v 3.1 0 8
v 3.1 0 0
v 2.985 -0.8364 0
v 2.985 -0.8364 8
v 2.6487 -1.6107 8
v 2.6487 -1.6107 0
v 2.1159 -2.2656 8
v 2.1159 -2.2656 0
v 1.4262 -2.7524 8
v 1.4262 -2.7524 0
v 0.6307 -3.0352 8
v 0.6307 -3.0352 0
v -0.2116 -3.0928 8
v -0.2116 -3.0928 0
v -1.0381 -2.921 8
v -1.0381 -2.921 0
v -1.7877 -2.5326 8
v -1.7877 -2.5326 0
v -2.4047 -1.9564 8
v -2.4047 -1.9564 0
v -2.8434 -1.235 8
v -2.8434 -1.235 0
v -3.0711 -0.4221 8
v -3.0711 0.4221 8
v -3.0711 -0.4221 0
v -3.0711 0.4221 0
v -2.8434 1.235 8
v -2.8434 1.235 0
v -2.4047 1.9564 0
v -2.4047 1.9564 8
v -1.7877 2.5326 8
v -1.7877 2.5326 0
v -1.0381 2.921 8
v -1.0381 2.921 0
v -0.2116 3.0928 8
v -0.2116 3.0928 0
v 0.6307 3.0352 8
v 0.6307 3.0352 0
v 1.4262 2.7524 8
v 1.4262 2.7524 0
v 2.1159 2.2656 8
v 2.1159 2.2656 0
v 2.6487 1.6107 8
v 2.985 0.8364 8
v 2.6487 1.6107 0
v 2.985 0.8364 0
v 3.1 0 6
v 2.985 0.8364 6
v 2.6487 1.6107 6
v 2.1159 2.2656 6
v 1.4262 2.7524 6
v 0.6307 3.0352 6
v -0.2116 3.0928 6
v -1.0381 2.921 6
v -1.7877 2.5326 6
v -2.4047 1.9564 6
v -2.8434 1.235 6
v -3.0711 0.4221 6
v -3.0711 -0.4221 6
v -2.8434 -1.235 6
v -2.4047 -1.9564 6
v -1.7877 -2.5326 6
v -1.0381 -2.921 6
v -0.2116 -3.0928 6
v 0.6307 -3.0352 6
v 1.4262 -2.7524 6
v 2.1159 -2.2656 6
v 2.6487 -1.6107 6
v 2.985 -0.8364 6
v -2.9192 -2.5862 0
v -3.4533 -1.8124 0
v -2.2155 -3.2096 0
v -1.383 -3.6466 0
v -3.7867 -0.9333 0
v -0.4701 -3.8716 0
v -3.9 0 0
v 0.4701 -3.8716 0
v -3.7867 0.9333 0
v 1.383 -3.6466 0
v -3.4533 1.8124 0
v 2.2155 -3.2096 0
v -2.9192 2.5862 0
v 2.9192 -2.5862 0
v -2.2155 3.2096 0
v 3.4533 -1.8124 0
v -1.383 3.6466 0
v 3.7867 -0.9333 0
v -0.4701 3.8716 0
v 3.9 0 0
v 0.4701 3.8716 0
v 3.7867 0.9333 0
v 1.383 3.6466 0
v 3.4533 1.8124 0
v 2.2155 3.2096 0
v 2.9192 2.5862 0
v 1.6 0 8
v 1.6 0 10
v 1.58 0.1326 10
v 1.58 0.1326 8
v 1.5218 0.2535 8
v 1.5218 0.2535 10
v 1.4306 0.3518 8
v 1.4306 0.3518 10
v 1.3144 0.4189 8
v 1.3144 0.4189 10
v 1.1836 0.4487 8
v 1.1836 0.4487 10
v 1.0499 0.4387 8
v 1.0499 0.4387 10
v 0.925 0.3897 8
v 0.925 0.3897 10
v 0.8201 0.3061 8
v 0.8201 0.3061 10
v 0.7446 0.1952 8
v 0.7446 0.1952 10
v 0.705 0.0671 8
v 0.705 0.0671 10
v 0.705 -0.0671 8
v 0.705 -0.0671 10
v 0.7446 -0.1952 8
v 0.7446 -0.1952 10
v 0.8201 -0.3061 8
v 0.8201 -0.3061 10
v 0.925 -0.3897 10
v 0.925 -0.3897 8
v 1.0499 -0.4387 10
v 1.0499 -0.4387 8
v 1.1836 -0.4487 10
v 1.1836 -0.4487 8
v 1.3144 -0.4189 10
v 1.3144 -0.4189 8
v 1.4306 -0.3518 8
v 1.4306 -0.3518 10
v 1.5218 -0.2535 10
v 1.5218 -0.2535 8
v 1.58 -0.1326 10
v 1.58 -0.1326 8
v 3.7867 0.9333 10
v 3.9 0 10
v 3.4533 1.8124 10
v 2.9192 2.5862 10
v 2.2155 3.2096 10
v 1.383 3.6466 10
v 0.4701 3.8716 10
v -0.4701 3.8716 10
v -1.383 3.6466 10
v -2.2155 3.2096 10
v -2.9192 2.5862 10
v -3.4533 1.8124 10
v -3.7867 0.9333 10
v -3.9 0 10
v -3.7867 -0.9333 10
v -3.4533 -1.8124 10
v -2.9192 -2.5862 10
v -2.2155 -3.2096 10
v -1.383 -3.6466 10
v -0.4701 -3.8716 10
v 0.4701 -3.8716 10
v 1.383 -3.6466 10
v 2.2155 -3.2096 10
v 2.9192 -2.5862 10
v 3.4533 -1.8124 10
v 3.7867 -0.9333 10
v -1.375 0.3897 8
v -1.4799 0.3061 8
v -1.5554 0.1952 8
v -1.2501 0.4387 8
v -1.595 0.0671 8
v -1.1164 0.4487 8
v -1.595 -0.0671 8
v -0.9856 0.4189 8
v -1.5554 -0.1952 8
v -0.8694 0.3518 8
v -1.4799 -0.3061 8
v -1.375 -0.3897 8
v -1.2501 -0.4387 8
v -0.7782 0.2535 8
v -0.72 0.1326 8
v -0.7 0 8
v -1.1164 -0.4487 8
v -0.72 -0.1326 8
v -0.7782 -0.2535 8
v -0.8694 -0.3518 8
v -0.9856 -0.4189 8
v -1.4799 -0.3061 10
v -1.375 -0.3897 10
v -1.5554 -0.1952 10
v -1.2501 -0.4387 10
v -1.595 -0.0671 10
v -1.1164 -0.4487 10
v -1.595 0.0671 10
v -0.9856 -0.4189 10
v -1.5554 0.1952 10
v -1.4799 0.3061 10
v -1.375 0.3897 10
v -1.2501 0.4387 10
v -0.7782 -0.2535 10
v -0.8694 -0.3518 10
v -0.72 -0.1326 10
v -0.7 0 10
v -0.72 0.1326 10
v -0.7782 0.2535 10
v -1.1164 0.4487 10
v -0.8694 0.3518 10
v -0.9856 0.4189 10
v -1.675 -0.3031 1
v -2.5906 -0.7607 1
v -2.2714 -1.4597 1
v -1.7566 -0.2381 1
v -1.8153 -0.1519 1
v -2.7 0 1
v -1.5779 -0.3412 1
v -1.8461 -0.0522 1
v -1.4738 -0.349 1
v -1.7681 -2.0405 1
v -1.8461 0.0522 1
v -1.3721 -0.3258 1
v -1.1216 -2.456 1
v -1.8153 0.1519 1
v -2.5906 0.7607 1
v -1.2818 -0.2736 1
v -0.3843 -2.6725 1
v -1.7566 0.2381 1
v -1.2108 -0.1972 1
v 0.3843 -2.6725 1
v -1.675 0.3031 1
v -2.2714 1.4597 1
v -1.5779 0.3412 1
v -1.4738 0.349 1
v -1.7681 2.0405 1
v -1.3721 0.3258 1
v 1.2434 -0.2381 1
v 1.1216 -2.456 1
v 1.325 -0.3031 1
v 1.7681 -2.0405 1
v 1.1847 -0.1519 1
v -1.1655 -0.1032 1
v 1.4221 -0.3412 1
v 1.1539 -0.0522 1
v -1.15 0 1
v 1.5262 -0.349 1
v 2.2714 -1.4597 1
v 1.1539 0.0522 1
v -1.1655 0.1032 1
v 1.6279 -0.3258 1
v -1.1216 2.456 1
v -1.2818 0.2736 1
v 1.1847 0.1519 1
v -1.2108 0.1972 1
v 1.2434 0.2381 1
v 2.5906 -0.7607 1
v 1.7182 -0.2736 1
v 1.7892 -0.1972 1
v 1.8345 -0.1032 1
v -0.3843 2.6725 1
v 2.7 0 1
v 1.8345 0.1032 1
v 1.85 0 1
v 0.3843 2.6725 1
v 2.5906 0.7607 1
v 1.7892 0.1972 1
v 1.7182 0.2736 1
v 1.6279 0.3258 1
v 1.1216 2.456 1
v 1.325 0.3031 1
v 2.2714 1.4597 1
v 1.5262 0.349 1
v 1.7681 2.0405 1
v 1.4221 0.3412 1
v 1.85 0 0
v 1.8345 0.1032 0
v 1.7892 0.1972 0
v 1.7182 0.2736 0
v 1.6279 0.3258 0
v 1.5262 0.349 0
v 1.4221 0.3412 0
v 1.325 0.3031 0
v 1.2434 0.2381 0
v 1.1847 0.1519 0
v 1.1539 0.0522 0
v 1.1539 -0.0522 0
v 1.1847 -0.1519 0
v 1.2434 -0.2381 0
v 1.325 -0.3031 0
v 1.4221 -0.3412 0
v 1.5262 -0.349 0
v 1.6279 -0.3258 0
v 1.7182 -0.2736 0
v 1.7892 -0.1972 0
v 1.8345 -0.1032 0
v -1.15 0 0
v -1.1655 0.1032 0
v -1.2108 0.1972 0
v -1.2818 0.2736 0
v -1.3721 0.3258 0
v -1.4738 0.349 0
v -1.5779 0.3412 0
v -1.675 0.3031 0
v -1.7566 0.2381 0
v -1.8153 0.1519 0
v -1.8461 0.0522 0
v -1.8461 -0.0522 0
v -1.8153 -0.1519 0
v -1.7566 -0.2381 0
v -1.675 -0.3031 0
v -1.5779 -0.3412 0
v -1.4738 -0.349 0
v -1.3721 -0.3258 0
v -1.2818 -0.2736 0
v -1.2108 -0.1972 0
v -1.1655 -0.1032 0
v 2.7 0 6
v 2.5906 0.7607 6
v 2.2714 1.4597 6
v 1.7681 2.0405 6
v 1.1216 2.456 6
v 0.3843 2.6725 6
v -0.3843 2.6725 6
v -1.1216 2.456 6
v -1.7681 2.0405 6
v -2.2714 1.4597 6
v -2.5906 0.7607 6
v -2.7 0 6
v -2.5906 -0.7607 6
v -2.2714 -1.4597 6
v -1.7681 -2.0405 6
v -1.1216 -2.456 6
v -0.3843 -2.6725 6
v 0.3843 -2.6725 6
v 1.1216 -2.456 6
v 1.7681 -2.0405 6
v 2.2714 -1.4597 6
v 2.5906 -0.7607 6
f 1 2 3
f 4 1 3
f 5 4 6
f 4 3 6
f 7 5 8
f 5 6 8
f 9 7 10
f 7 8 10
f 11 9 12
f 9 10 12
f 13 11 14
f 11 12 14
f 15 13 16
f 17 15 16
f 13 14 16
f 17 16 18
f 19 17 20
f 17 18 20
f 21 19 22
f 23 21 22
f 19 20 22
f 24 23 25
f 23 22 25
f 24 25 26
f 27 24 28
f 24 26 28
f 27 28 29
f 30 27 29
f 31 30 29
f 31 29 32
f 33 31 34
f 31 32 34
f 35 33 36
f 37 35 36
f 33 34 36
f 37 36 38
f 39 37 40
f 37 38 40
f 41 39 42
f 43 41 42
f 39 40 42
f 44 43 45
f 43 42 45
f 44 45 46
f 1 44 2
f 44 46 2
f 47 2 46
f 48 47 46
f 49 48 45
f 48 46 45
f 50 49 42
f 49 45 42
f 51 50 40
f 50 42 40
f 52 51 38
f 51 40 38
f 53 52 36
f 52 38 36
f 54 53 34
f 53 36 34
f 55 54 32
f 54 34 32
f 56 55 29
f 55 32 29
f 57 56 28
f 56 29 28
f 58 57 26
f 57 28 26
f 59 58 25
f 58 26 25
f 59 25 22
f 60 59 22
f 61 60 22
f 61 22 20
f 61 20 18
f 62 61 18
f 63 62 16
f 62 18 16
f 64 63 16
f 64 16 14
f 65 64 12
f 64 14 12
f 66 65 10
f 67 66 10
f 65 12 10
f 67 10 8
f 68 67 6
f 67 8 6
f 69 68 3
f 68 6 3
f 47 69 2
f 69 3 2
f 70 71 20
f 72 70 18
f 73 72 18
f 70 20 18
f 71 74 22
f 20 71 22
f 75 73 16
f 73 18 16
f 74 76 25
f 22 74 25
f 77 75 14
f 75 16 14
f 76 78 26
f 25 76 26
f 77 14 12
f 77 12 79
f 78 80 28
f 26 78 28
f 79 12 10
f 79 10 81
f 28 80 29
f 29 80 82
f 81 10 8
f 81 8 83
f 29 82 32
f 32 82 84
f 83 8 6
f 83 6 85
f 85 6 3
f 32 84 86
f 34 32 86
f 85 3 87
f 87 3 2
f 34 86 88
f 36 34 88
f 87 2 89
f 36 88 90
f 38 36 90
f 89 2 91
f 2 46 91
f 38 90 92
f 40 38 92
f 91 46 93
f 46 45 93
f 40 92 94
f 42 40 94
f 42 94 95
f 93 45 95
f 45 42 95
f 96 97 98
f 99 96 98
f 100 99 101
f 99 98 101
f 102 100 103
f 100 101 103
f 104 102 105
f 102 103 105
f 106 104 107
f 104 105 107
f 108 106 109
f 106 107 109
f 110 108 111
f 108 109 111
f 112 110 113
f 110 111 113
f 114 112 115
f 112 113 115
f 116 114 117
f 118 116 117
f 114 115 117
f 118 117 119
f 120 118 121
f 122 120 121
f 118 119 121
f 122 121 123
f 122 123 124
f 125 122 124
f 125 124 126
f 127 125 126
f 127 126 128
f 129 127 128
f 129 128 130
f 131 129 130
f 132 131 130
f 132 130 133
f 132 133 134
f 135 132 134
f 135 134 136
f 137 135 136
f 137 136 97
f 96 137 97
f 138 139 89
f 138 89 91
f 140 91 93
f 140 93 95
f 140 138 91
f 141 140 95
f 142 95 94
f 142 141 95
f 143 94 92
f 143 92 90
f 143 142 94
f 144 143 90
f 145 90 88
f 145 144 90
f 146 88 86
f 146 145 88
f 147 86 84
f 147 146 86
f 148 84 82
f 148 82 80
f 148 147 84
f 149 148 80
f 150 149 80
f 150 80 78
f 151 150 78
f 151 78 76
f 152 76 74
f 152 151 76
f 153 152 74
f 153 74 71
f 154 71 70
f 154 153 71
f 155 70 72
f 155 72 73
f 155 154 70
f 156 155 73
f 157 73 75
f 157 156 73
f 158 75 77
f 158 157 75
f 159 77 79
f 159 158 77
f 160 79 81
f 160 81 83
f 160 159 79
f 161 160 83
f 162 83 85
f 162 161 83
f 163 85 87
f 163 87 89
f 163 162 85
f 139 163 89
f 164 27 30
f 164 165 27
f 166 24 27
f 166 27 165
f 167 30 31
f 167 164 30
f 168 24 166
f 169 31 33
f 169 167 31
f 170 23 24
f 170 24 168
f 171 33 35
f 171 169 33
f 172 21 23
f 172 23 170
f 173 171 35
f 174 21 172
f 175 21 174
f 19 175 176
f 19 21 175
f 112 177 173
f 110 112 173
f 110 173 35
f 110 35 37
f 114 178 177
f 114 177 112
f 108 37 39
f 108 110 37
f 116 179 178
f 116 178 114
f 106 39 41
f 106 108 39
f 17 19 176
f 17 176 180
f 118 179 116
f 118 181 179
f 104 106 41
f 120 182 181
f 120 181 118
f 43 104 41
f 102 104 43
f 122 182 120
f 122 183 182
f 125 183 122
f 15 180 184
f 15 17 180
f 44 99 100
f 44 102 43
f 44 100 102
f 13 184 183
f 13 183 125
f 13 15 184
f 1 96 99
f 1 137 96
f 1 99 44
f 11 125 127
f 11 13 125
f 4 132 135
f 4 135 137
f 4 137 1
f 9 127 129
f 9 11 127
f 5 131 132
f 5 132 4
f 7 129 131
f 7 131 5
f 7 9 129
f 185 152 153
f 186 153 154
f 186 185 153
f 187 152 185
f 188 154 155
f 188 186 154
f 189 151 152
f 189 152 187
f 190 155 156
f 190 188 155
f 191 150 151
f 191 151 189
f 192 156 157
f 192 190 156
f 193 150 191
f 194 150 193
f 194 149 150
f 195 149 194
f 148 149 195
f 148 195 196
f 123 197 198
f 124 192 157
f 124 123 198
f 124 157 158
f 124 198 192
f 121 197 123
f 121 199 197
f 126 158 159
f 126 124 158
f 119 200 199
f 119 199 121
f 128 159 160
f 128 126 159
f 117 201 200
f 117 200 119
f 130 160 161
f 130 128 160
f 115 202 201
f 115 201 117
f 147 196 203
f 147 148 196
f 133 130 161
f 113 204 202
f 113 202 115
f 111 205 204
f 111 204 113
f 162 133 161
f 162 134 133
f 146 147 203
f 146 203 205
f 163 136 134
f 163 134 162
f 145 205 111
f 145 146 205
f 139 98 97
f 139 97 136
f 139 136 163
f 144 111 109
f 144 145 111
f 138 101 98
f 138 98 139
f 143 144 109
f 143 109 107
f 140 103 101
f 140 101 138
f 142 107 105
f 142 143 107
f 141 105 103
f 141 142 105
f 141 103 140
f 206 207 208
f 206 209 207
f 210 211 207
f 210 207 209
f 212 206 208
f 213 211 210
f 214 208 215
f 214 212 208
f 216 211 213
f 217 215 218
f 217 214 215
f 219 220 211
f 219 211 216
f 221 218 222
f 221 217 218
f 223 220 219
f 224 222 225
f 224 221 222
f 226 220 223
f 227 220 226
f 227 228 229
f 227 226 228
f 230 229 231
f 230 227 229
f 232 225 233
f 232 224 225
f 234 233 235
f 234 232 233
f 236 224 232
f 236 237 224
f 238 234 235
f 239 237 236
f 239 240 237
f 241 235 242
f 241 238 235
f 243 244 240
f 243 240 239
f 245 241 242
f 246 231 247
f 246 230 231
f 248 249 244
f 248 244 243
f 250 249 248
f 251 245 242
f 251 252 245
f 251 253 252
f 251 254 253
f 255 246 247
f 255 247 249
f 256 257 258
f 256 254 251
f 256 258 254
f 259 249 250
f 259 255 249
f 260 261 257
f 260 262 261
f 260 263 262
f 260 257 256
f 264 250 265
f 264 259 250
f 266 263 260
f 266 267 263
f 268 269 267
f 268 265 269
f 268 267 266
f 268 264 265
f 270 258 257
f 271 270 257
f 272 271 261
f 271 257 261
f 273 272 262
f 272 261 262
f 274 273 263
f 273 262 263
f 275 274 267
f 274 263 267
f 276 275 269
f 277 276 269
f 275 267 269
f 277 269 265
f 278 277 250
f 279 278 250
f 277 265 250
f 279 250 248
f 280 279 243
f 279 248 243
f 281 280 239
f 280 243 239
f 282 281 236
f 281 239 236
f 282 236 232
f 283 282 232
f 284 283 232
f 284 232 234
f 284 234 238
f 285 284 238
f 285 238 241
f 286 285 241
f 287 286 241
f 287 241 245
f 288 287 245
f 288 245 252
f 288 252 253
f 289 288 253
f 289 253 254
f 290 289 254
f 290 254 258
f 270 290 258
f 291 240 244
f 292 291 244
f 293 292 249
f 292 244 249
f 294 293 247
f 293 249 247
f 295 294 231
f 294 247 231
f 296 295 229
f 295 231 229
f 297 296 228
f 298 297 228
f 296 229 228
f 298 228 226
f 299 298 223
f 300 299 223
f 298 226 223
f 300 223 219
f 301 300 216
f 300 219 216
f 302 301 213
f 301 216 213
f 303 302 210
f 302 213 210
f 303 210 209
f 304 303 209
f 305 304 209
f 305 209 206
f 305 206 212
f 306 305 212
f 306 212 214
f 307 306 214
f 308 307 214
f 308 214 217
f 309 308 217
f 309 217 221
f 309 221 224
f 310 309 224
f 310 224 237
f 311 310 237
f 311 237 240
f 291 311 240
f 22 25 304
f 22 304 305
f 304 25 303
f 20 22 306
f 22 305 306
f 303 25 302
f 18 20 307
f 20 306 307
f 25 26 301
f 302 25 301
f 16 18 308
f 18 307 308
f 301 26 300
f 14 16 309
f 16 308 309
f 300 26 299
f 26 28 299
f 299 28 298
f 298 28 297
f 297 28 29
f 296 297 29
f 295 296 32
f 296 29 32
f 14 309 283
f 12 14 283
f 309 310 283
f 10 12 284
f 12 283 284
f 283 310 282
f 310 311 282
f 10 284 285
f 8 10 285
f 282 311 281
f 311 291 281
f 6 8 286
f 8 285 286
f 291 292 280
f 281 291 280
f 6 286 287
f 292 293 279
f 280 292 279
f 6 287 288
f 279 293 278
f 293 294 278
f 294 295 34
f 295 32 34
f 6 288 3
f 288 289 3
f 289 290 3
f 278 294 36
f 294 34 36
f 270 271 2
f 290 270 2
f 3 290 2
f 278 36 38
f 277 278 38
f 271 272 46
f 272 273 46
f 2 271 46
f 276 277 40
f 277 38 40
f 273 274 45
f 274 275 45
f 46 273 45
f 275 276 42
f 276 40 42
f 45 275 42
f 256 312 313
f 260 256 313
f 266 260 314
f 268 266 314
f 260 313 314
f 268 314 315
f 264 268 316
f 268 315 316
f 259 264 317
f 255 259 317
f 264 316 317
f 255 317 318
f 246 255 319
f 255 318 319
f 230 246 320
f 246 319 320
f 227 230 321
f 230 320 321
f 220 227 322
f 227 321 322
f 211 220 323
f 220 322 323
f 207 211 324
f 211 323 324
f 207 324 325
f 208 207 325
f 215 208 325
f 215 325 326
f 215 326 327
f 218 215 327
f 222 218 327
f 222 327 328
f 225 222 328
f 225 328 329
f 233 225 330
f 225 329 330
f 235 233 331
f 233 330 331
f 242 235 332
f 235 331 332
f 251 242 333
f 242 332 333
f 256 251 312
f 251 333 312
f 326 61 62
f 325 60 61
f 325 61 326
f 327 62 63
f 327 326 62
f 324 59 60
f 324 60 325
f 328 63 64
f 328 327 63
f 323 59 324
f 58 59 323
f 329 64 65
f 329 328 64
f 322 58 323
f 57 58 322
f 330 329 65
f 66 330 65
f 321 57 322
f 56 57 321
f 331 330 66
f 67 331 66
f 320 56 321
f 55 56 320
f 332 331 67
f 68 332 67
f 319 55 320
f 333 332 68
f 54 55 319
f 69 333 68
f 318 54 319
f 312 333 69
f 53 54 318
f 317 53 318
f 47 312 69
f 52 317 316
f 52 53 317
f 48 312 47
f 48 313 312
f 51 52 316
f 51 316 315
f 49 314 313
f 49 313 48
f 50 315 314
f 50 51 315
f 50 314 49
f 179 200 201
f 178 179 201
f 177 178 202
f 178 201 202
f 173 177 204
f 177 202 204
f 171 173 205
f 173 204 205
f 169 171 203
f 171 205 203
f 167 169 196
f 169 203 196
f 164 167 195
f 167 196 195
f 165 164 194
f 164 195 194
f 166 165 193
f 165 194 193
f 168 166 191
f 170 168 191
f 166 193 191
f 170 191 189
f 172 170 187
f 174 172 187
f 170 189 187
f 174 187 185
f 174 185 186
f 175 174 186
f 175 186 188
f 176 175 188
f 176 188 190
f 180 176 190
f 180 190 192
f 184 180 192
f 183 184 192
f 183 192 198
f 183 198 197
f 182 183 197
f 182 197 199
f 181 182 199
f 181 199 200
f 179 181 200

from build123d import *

# Parameters (mm, degrees)
SKETCH_R        = 3.1
PAD_DEPTH       = 6
SKETCH001_R     = 2.7
POCKET_DEPTH    = 5
SKETCH002_R     = 0.35
POCKET001_DEPTH = 1.001
SKETCH003_R     = 3.9
PAD001_DEPTH    = 10
SKETCH004_R     = 3.1
POCKET002_DEPTH = 8
SKETCH005_R     = 0.45
POCKET003_DEPTH = 10.001


with BuildPart() as ldr_housing:
    # Sketch → Pad (new body)
    with BuildSketch(Plane.XY):
        Circle(SKETCH_R)
    extrude(amount=PAD_DEPTH)

    # Sketch001 (on Face3 of Pad) → Pocket (cut)
    with BuildSketch(Plane.XY.offset(6)):
        Circle(SKETCH001_R)
    extrude(amount=-POCKET_DEPTH, mode=Mode.SUBTRACT)

    # Sketch002 (on Face5 of Pocket) → Pocket001 (cut, through all)
    with BuildSketch(Plane.XY.offset(1)):
        with Locations((-1.5, 0)):
            Circle(SKETCH002_R)
        with Locations((1.5, 0)):
            Circle(SKETCH002_R)
    extrude(amount=-POCKET001_DEPTH, mode=Mode.SUBTRACT)


with BuildPart() as led_housing:
    # Sketch003 (on DatumPlane) → Pad001 (new body)
    with BuildSketch(Plane.XY.offset(10)):
        Circle(SKETCH003_R)
    extrude(amount=-PAD001_DEPTH)

    # Sketch004 (on Face3 of Pad001) → Pocket002 (cut)
    with BuildSketch(Plane(origin=(0, 0, 0), x_dir=(1, 0, 0), z_dir=(0, 0, -1))):
        Circle(SKETCH004_R)
    extrude(amount=-POCKET002_DEPTH, mode=Mode.SUBTRACT)

    # Sketch005 (on Face2 of Pocket002) → Pocket003 (cut, through all)
    with BuildSketch(Plane.XY.offset(10)):
        with Locations((-1.15, 0)):
            Circle(SKETCH005_R)
        with Locations((1.15, 0)):
            Circle(SKETCH005_R)
    extrude(amount=-POCKET003_DEPTH, mode=Mode.SUBTRACT)


solid = Compound([ldr_housing.part, led_housing.part])
